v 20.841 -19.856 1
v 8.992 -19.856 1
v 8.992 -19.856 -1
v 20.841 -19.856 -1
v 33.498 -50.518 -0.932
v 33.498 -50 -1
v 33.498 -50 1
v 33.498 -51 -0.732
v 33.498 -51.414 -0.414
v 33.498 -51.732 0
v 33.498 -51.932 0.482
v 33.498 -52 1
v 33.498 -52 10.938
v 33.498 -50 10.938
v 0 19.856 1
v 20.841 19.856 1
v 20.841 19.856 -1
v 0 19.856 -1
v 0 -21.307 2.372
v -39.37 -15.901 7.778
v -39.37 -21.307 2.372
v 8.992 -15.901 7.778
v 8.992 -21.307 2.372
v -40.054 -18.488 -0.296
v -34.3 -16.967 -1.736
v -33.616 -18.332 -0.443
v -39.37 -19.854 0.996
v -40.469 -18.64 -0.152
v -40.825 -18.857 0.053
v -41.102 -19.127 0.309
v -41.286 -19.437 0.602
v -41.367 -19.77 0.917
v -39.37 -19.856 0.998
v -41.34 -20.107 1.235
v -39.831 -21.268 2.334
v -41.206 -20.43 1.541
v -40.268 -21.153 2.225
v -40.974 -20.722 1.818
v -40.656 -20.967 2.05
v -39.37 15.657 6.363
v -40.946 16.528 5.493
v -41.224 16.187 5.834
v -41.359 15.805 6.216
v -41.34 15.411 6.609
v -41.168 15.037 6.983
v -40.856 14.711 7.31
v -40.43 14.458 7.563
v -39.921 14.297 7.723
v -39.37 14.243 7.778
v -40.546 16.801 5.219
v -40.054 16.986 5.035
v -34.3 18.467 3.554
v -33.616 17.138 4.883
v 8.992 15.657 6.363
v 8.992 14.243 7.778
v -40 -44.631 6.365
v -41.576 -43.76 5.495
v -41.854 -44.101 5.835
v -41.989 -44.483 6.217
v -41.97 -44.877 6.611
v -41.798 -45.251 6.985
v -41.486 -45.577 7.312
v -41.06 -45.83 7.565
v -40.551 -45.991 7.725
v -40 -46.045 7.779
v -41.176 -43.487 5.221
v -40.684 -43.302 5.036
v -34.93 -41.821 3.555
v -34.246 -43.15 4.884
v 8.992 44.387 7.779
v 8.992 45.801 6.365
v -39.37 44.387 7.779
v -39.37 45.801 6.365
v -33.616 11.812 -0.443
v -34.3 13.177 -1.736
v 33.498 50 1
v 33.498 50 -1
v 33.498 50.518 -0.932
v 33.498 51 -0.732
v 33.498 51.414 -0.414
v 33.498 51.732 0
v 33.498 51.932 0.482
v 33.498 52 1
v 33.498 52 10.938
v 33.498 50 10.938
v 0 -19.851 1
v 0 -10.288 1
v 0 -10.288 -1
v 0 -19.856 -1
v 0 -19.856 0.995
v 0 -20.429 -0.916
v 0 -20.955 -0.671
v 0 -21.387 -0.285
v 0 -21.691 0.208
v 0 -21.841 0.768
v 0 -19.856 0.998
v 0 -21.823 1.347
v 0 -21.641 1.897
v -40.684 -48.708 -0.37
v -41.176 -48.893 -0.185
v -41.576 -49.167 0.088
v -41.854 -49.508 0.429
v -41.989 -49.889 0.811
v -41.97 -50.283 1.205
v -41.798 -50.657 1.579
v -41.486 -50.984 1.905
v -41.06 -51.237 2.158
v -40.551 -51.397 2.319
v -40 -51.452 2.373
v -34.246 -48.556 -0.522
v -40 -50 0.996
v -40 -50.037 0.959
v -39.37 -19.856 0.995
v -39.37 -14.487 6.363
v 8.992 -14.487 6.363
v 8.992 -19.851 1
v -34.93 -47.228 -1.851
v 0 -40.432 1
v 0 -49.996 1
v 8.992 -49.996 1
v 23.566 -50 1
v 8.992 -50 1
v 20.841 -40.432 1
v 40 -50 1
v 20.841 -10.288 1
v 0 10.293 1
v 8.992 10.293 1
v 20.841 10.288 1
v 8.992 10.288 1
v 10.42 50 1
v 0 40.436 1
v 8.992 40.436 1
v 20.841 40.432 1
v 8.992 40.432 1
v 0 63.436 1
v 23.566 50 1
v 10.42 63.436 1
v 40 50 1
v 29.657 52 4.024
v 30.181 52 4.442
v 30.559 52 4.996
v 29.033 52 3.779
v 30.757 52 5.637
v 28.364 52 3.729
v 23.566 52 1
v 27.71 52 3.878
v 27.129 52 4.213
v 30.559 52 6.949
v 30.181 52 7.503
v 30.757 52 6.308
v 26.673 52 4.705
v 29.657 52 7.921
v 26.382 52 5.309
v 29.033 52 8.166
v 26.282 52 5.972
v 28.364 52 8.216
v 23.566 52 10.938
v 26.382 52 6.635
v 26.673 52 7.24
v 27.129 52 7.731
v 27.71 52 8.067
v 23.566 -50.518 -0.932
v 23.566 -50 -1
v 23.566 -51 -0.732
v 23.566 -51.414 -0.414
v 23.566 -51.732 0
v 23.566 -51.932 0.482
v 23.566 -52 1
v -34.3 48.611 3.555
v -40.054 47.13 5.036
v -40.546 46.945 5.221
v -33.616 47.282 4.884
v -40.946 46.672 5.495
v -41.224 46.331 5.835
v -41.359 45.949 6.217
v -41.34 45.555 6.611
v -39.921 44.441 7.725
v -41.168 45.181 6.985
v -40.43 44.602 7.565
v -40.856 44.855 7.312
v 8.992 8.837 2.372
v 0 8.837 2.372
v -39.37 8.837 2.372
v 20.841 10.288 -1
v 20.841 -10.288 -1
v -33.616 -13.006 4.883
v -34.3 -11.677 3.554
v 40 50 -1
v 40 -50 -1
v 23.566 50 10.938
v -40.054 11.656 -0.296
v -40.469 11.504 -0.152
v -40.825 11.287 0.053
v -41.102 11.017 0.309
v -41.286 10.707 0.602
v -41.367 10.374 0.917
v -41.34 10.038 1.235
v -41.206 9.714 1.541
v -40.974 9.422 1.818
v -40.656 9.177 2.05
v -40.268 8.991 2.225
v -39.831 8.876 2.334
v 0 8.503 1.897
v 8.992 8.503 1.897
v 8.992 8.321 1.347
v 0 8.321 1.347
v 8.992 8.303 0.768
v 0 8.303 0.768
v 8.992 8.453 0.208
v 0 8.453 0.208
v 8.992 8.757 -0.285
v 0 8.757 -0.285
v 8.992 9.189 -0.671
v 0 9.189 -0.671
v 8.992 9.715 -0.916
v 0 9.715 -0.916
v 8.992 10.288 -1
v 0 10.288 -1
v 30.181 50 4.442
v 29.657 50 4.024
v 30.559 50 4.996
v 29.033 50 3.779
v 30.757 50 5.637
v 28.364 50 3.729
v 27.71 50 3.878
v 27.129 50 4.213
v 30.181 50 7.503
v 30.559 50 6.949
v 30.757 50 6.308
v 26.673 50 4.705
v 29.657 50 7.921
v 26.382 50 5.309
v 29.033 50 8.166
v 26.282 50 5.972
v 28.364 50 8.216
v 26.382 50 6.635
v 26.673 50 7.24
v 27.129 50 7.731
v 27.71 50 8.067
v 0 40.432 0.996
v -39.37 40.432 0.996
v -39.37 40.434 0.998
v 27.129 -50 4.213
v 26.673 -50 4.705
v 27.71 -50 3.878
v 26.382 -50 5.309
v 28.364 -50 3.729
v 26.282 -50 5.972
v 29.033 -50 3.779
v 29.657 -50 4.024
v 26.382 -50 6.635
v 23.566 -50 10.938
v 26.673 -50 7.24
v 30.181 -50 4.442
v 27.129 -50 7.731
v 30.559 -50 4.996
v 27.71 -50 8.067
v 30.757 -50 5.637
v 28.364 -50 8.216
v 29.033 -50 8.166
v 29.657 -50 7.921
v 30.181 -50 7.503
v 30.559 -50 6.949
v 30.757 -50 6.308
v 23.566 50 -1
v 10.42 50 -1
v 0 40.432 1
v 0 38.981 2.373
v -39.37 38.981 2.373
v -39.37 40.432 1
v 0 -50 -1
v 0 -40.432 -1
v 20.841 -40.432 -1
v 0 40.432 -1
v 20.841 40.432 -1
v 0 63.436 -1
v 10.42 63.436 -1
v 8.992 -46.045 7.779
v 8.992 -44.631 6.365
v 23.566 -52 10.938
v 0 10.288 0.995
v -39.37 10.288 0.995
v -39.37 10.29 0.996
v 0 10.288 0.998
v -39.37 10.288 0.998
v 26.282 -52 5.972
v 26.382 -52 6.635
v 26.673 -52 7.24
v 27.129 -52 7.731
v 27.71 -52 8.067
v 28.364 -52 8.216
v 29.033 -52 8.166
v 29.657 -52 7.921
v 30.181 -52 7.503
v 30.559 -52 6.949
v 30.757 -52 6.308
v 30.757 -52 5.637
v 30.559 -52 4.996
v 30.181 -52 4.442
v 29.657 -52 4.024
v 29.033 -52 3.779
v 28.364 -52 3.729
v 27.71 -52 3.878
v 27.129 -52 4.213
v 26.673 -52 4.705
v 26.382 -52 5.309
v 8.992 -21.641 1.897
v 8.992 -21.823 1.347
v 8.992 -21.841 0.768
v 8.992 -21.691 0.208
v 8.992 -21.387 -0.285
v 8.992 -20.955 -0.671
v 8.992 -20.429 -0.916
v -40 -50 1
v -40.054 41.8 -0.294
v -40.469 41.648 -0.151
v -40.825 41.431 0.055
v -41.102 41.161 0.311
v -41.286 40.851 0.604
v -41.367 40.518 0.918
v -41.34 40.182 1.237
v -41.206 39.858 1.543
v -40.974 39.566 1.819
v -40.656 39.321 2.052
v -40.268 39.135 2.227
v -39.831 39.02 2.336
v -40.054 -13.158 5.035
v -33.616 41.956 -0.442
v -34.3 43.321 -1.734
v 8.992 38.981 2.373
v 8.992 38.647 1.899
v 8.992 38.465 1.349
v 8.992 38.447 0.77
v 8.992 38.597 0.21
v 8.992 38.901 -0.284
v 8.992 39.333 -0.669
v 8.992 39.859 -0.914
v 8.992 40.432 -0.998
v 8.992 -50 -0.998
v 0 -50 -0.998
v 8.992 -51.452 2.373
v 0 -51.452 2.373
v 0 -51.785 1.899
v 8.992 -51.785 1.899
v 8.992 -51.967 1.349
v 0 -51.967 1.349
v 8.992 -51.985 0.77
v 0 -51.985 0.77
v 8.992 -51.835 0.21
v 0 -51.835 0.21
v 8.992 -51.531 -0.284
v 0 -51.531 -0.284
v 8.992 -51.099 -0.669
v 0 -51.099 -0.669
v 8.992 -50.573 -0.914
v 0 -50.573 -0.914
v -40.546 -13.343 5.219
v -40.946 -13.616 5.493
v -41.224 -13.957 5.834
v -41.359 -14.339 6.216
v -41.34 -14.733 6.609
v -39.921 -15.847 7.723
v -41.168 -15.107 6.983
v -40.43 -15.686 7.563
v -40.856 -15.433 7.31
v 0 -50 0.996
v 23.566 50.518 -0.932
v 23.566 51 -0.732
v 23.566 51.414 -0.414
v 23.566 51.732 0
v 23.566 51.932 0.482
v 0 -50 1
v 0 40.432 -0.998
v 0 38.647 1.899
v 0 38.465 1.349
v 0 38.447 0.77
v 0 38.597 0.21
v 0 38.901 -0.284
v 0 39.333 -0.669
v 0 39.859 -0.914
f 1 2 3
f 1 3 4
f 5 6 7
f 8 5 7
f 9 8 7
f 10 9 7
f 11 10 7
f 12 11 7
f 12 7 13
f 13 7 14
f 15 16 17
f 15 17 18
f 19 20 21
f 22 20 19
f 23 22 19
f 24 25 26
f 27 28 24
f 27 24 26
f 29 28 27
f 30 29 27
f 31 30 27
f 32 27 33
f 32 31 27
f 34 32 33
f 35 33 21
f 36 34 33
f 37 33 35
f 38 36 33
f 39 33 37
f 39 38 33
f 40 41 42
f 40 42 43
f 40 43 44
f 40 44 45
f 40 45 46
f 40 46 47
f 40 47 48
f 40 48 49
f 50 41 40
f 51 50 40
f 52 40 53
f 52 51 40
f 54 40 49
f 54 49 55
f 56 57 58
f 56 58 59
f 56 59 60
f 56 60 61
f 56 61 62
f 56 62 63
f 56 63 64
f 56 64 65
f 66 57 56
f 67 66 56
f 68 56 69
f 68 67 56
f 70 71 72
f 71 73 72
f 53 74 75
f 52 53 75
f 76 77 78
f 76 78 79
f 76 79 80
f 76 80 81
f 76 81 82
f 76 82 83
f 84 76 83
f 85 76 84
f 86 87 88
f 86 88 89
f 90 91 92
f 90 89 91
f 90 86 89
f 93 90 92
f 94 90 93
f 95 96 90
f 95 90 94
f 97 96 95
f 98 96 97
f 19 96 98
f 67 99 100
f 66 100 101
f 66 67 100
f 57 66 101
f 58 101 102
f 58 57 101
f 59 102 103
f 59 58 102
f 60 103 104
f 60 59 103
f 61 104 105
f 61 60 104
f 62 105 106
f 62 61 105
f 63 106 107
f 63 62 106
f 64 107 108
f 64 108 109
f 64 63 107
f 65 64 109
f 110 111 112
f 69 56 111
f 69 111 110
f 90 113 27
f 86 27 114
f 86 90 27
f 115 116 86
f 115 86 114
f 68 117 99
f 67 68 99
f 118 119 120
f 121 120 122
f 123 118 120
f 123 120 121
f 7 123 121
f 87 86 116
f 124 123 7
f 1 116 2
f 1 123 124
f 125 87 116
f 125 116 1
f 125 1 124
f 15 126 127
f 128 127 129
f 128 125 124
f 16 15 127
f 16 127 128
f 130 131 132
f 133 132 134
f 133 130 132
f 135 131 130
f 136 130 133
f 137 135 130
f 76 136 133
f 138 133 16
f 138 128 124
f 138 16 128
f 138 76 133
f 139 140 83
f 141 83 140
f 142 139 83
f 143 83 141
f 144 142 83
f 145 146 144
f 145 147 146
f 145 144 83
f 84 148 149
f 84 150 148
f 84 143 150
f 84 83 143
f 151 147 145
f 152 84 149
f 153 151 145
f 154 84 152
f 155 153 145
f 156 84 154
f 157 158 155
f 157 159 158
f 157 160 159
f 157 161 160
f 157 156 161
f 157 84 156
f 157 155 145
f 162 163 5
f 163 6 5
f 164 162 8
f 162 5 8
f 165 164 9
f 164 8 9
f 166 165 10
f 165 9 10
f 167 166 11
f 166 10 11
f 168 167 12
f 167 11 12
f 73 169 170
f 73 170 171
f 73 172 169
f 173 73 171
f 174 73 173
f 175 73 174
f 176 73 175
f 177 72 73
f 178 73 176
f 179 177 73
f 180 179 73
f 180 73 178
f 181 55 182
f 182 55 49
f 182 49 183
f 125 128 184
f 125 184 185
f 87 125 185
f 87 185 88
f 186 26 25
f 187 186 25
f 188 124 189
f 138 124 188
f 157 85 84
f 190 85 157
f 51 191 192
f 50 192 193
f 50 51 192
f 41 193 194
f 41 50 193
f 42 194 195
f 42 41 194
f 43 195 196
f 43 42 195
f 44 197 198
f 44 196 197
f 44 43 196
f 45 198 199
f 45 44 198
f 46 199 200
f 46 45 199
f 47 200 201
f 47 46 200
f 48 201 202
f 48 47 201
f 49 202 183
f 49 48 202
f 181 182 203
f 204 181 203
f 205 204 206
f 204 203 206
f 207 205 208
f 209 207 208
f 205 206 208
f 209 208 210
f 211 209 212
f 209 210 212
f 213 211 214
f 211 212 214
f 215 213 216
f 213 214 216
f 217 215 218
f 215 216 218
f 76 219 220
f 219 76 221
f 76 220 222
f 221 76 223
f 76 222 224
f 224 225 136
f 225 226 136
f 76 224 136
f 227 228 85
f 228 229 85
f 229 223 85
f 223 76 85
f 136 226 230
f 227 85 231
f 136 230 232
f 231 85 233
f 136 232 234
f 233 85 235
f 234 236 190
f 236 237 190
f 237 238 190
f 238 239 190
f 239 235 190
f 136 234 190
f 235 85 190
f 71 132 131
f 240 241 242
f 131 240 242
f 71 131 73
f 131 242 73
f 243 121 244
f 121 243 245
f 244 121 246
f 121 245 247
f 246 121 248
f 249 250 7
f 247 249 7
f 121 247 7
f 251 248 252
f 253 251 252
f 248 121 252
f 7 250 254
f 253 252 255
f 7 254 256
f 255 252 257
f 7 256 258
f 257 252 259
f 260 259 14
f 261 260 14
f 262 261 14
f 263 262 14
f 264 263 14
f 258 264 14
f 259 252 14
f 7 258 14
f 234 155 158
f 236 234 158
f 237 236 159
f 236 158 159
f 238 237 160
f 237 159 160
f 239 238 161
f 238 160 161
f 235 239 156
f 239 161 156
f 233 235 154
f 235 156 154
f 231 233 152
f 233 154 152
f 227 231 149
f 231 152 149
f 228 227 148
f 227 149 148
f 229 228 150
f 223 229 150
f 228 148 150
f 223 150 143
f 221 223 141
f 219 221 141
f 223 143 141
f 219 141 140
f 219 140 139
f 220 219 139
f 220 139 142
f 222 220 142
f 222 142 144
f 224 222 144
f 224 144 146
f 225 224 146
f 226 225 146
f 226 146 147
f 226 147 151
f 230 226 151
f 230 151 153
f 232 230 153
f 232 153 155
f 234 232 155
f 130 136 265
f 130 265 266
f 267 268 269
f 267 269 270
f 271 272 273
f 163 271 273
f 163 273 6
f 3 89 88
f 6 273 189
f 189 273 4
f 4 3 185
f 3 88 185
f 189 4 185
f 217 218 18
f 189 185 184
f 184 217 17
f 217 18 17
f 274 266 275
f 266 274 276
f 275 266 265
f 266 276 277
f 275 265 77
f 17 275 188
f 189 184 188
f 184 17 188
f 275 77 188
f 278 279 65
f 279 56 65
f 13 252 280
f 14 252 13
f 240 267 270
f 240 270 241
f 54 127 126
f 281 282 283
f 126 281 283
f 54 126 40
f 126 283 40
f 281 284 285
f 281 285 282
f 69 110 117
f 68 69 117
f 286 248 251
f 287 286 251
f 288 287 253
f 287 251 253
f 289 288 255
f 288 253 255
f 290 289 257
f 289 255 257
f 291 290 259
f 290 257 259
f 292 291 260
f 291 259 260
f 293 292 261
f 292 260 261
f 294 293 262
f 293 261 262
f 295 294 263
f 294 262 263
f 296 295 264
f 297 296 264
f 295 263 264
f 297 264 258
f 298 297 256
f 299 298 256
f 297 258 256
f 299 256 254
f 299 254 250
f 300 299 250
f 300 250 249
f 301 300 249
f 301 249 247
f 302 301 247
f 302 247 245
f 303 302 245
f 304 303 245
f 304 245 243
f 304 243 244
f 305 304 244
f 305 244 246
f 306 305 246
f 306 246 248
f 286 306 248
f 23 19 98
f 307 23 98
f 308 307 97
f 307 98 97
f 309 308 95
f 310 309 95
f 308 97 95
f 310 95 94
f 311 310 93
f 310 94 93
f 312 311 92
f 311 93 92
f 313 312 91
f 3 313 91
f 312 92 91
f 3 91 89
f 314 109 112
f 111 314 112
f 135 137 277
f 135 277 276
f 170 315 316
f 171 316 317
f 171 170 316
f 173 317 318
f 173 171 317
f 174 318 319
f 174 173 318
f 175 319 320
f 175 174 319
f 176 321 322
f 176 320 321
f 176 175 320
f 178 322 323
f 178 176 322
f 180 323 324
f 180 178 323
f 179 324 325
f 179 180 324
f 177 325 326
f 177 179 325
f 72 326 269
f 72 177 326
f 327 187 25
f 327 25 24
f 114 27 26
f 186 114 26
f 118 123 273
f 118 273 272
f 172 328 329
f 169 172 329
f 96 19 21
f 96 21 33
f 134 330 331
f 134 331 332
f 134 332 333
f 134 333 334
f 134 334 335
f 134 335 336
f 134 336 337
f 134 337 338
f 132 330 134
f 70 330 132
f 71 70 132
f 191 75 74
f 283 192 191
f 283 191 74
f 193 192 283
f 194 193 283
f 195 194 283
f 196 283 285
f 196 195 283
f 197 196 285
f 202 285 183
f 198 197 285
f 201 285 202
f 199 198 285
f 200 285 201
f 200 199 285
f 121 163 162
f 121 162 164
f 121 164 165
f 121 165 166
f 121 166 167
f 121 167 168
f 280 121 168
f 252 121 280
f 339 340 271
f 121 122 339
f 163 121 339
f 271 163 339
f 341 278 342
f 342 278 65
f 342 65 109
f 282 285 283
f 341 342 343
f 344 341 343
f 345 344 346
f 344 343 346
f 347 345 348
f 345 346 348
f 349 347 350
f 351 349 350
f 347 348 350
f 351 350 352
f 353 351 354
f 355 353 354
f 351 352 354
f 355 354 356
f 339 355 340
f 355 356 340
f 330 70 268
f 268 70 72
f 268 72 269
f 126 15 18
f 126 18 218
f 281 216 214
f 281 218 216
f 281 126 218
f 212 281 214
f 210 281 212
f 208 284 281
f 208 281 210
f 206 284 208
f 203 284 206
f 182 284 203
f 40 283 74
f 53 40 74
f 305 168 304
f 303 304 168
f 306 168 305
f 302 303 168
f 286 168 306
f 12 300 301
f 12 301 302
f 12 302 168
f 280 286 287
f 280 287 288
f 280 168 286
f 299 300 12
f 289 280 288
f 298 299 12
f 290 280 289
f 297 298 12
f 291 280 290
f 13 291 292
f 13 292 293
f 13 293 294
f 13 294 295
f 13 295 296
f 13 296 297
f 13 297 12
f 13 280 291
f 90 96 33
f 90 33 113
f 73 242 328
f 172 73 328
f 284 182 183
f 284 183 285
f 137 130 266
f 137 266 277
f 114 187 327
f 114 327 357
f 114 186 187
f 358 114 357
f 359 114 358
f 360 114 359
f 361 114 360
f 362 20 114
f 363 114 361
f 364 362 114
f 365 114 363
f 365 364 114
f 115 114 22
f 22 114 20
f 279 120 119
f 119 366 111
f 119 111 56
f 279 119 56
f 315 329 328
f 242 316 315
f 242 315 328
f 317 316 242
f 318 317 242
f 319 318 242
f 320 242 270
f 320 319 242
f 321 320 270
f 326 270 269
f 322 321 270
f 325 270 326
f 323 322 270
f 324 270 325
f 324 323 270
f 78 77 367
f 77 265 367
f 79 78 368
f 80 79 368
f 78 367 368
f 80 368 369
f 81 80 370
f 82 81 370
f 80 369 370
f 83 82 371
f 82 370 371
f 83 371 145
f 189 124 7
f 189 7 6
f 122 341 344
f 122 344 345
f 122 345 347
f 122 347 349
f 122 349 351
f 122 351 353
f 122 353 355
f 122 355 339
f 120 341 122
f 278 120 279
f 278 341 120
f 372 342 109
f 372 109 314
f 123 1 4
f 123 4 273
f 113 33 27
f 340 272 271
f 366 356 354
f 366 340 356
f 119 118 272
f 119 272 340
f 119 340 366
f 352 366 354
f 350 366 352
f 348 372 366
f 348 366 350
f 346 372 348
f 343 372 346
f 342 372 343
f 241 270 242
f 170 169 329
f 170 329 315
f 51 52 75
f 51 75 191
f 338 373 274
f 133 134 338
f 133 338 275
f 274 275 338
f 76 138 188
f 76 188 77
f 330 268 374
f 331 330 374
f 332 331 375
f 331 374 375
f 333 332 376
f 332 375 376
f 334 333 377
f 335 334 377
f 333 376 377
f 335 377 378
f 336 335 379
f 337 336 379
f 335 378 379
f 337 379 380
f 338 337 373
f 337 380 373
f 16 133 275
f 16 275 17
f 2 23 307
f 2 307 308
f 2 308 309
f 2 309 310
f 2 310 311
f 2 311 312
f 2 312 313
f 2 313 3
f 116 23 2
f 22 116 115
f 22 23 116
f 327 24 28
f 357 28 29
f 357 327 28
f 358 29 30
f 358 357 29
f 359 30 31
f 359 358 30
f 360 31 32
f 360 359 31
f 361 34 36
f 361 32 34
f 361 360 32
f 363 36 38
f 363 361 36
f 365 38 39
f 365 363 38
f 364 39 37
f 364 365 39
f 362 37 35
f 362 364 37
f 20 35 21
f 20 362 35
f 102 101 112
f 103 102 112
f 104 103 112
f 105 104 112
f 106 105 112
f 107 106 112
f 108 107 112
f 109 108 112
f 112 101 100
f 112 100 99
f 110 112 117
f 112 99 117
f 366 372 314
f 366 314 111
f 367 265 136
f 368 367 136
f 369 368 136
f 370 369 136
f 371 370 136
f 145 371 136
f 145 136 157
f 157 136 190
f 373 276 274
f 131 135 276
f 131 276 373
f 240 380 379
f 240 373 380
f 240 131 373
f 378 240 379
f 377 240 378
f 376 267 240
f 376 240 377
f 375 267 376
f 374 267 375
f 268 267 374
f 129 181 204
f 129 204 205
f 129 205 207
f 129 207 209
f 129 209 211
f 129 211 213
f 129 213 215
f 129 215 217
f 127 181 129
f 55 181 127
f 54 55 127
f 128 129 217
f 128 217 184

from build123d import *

# Parameters (mm, degrees)
F1_DEPTH  = 1
F3_DEPTH  = 40
F5_DEPTH  = 7.6454254
F8_DEPTH  = 8.9916
F9_DEPTH  = 39.37
F11_REACH = 42.1217729552
F13_REACH = 63.4368099505
F15_REACH = 84.7531019793
F16_W     = 9.9314
F16_H     = 11.938
F17_DEPTH = 2
F18_W     = 9.9314
F18_H     = 11.938
F19_DEPTH = 2
F20_R     = 2
F22_D     = 4.5


with BuildPart() as f1:
    # F0 (on Top) → F1 (new body, symmetric)
    with BuildSketch(Plane.XY):
        Polygon((40, -50), (40, 50), (10.4203875556, 50), (10.4203875556, 63.4358227253), (0, 63.4358227253), (0, 50), (0, 40.4320432043), (20.8407751113, 40.4320432043), (20.8407751113, 19.8559855986), (0, 19.8559855986), (0, 10.2880288029), (20.8407751113, 10.2880288029), (20.8407751113, -10.2880288029), (0, -10.2880288029), (0, -19.8559855986), (20.8407751113, -19.8559855986), (20.8407751113, -40.4320432043), (0, -40.4320432043), (0, -50), align=None)
    extrude(amount=F1_DEPTH, both=True)

    # F2 (on Right) → F3 (join)
    with BuildSketch(Plane.YZ):
        Polygon((-50, 1), (-50, 0.9964082731), (-44.6311706177, 6.3652376554), (-46.04538418, 7.7794512178), (-51.4515079706, 2.3733274272), align=None)
    extrude(amount=-F3_DEPTH)

    # F4 (on face) → F5 (join)
    with BuildSketch(Plane(origin=(0, -19.1329664811, -19.1329664811), x_dir=(1, 0, 0), z_dir=(0, 0.7071067812, 0.7071067812))):
        with BuildLine():
            Line((-34.9300994608, -32.0862576741), (-40.6840402867, -34.1805208645))
            ThreePointArc((-40.6840402867, -34.1805208645), (-41.969615506, -36.4072024614), (-40, -38.059906106))
            Line((-40, -38.059906106), (-40, -36.059906106))
            Line((-40, -36.059906106), (-34.2460591741, -33.9656429157))
            Line((-34.2460591741, -33.9656429157), (-34.9300994608, -32.0862576741))
        make_face()
    extrude(amount=-F5_DEPTH)

    # F6 (on Right) + F2 (on Right) + F7 (on Right) → F8 (join)
    with BuildSketch(Plane.YZ):
        Polygon((-19.8559855986, 0.9982251152), (-19.8559855986, 0.9946333883), (-14.4871562162, 6.3634627706), (-15.9013697786, 7.777676333), (-21.3074935692, 2.3715525424), align=None)
        with BuildLine():
            Line((-19.8559855986, -1), (-19.8559855986, 0.9946333883))
            Line((-19.8559855986, 0.9946333883), (-19.8559855986, 0.9982251152))
            Line((-19.8559855986, 0.9982251152), (-21.3074935692, 2.3715525424))
            ThreePointArc((-21.3074935692, 2.3715525424), (-21.6913494545, 0.2080712521), (-19.8559855986, -1))
        make_face()
    with BuildSketch(Plane.YZ):
        Polygon((-50, 1), (-50, 0.9964082731), (-44.6311706177, 6.3652376554), (-46.04538418, 7.7794512178), (-51.4515079706, 2.3733274272), align=None)
        with BuildLine():
            Line((-50, -0.9982251152), (-50, 0.9964082731))
            Line((-50, 0.9964082731), (-50, 1))
            Line((-50, 1), (-51.4515079706, 2.3733274272))
            ThreePointArc((-51.4515079706, 2.3733274272), (-51.8353638559, 0.2098461369), (-50, -0.9982251152))
        make_face()
    with BuildSketch(Plane.YZ):
        Polygon((10.2880288029, 0.9982251152), (10.2880288029, 0.9946333883), (15.6568581852, 6.3634627706), (14.2426446228, 7.777676333), (8.8365208322, 2.3715525424), align=None)
        with BuildLine():
            Line((10.2880288029, -1), (10.2880288029, 0.9946333883))
            Line((10.2880288029, 0.9946333883), (10.2880288029, 0.9982251152))
            Line((10.2880288029, 0.9982251152), (8.8365208322, 2.3715525424))
            ThreePointArc((8.8365208322, 2.3715525424), (8.4526649469, 0.2080712521), (10.2880288029, -1))
        make_face()
        Polygon((40.4320432043, 1), (40.4320432043, 0.9964082731), (45.8008725867, 6.3652376554), (44.3866590243, 7.7794512177), (38.9805352337, 2.3733274272), align=None)
        with BuildLine():
            Line((40.4320432043, -0.9982251152), (40.4320432043, 0.9964082731))
            Line((40.4320432043, 0.9964082731), (40.4320432043, 1))
            Line((40.4320432043, 1), (38.9805352337, 2.3733274272))
            ThreePointArc((38.9805352337, 2.3733274272), (38.5966793484, 0.2098461369), (40.4320432043, -0.9982251152))
        make_face()
    extrude(amount=F8_DEPTH)

    # F6 (on Right) + F7 (on Right) → F9 (join)
    with BuildSketch(Plane.YZ):
        Polygon((-19.8559855986, 0.9982251152), (-19.8559855986, 0.9946333883), (-14.4871562162, 6.3634627706), (-15.9013697786, 7.777676333), (-21.3074935692, 2.3715525424), align=None)
    with BuildSketch(Plane.YZ):
        Polygon((10.2880288029, 0.9982251152), (10.2880288029, 0.9946333883), (15.6568581852, 6.3634627706), (14.2426446228, 7.777676333), (8.8365208322, 2.3715525424), align=None)
        Polygon((40.4320432043, 1), (40.4320432043, 0.9964082731), (45.8008725867, 6.3652376554), (44.3866590243, 7.7794512177), (38.9805352337, 2.3733274272), align=None)
    extrude(amount=-F9_DEPTH)

    f11_end = Plane(origin=(-19.685, -20.5817395839, 1.6848888288), x_dir=(0, -0.7263986223, 0.6872736293), z_dir=(0, -0.6872736293, -0.7263986223))
    # F10 (on face) → F11 (join, up to a plane its end follows)
    with BuildSketch(Plane(origin=(0, -4.0618467228, -4.0618467228), x_dir=(-1, 0, 0), z_dir=(0, 0.7071067812, 0.7071067812))):
        with BuildLine():
            Line((34.3000994608, 10.7699656456), (40.0540402867, 12.8642288359))
            ThreePointArc((40.0540402867, 12.8642288359), (41.339615506, 15.0909104328), (39.37, 16.7436140775))
            Line((39.37, 16.7436140775), (39.37, 14.7436140775))
            Line((39.37, 14.7436140775), (33.6160591741, 12.6493508872))
            Line((33.6160591741, 12.6493508872), (34.3000994608, 10.7699656456))
        make_face()
    f11_long = extrude(amount=-F11_REACH, mode=Mode.PRIVATE)
    add(split(f11_long, bisect_by=f11_end, keep=Keep.BOTTOM, mode=Mode.PRIVATE))

    f13_end = Plane(origin=(-19.685, 9.5622748176, 1.6848888288), x_dir=(0, -0.7263986223, 0.6872736293), z_dir=(0, -0.6872736293, -0.7263986223))
    # F12 (on face) → F13 (join, up to a plane its end follows)
    with BuildSketch(Plane(origin=(0, 11.0101604779, 11.0101604779), x_dir=(1, 0, 0), z_dir=(0, 0.7071067812, 0.7071067812))):
        with BuildLine():
            Line((-34.3000994608, 10.5450713499), (-40.0540402867, 8.4508081595))
            ThreePointArc((-40.0540402867, 8.4508081595), (-41.339615506, 6.2241265626), (-39.37, 4.5714229179))
            Line((-39.37, 4.5714229179), (-39.37, 6.5714229179))
            Line((-39.37, 6.5714229179), (-33.6160591741, 8.6656861083))
            Line((-33.6160591741, 8.6656861083), (-34.3000994608, 10.5450713499))
        make_face()
    f13_long = extrude(amount=-F13_REACH, mode=Mode.PRIVATE)
    add(split(f13_long, bisect_by=f13_end, keep=Keep.BOTTOM, mode=Mode.PRIVATE))

    f15_end = Plane(origin=(-19.685, 39.706289219, 1.6866637136), x_dir=(0, -0.7263986223, 0.6872736293), z_dir=(0, -0.6872736293, -0.7263986223))
    # F14 (on face) → F15 (join, up to a plane its end follows)
    with BuildSketch(Plane(origin=(0, 26.0830551211, 26.083055121), x_dir=(-1, 0, 0), z_dir=(0, 0.7071067812, 0.7071067812))):
        with BuildLine():
            Line((34.3000994608, -31.8588533121), (40.0540402867, -29.7645901218))
            ThreePointArc((40.0540402867, -29.7645901218), (41.339615506, -27.5379085249), (39.37, -25.8852048802))
            Line((39.37, -25.8852048802), (39.37, -27.8852048802))
            Line((39.37, -27.8852048802), (33.6160591741, -29.9794680706))
            Line((33.6160591741, -29.9794680706), (34.3000994608, -31.8588533121))
        make_face()
    f15_long = extrude(amount=-F15_REACH, mode=Mode.PRIVATE)
    add(split(f15_long, bisect_by=f15_end, keep=Keep.BOTTOM, mode=Mode.PRIVATE))

    # F16 (on face) → F17 (join)
    with BuildSketch(Plane(origin=(0, 50, 0), x_dir=(-1, 0, 0), z_dir=(0, 1, 0))):
        with Locations((-28.5319, 4.969)):
            Rectangle(F16_W, F16_H)
    extrude(amount=F17_DEPTH)

    # F18 (on face) → F19 (join)
    with BuildSketch(Plane.XZ.offset(50)):
        with Locations((28.5319, 4.969)):
            Rectangle(F18_W, F18_H)
    extrude(amount=F19_DEPTH)

    # F20
    f20_edges = [f1.edges().sort_by_distance(p)[0] for p in [
        (28.5319, -52, -1),
        (28.5319, 52, -1),
    ]]
    fillet(f20_edges, radius=F20_R)

    # F22 (through all)
    with Locations(Plane.XZ.offset(52)):
        with Locations((28.5319, 5.9723)):
            Hole(F22_D / 2)


solid = f1.part
